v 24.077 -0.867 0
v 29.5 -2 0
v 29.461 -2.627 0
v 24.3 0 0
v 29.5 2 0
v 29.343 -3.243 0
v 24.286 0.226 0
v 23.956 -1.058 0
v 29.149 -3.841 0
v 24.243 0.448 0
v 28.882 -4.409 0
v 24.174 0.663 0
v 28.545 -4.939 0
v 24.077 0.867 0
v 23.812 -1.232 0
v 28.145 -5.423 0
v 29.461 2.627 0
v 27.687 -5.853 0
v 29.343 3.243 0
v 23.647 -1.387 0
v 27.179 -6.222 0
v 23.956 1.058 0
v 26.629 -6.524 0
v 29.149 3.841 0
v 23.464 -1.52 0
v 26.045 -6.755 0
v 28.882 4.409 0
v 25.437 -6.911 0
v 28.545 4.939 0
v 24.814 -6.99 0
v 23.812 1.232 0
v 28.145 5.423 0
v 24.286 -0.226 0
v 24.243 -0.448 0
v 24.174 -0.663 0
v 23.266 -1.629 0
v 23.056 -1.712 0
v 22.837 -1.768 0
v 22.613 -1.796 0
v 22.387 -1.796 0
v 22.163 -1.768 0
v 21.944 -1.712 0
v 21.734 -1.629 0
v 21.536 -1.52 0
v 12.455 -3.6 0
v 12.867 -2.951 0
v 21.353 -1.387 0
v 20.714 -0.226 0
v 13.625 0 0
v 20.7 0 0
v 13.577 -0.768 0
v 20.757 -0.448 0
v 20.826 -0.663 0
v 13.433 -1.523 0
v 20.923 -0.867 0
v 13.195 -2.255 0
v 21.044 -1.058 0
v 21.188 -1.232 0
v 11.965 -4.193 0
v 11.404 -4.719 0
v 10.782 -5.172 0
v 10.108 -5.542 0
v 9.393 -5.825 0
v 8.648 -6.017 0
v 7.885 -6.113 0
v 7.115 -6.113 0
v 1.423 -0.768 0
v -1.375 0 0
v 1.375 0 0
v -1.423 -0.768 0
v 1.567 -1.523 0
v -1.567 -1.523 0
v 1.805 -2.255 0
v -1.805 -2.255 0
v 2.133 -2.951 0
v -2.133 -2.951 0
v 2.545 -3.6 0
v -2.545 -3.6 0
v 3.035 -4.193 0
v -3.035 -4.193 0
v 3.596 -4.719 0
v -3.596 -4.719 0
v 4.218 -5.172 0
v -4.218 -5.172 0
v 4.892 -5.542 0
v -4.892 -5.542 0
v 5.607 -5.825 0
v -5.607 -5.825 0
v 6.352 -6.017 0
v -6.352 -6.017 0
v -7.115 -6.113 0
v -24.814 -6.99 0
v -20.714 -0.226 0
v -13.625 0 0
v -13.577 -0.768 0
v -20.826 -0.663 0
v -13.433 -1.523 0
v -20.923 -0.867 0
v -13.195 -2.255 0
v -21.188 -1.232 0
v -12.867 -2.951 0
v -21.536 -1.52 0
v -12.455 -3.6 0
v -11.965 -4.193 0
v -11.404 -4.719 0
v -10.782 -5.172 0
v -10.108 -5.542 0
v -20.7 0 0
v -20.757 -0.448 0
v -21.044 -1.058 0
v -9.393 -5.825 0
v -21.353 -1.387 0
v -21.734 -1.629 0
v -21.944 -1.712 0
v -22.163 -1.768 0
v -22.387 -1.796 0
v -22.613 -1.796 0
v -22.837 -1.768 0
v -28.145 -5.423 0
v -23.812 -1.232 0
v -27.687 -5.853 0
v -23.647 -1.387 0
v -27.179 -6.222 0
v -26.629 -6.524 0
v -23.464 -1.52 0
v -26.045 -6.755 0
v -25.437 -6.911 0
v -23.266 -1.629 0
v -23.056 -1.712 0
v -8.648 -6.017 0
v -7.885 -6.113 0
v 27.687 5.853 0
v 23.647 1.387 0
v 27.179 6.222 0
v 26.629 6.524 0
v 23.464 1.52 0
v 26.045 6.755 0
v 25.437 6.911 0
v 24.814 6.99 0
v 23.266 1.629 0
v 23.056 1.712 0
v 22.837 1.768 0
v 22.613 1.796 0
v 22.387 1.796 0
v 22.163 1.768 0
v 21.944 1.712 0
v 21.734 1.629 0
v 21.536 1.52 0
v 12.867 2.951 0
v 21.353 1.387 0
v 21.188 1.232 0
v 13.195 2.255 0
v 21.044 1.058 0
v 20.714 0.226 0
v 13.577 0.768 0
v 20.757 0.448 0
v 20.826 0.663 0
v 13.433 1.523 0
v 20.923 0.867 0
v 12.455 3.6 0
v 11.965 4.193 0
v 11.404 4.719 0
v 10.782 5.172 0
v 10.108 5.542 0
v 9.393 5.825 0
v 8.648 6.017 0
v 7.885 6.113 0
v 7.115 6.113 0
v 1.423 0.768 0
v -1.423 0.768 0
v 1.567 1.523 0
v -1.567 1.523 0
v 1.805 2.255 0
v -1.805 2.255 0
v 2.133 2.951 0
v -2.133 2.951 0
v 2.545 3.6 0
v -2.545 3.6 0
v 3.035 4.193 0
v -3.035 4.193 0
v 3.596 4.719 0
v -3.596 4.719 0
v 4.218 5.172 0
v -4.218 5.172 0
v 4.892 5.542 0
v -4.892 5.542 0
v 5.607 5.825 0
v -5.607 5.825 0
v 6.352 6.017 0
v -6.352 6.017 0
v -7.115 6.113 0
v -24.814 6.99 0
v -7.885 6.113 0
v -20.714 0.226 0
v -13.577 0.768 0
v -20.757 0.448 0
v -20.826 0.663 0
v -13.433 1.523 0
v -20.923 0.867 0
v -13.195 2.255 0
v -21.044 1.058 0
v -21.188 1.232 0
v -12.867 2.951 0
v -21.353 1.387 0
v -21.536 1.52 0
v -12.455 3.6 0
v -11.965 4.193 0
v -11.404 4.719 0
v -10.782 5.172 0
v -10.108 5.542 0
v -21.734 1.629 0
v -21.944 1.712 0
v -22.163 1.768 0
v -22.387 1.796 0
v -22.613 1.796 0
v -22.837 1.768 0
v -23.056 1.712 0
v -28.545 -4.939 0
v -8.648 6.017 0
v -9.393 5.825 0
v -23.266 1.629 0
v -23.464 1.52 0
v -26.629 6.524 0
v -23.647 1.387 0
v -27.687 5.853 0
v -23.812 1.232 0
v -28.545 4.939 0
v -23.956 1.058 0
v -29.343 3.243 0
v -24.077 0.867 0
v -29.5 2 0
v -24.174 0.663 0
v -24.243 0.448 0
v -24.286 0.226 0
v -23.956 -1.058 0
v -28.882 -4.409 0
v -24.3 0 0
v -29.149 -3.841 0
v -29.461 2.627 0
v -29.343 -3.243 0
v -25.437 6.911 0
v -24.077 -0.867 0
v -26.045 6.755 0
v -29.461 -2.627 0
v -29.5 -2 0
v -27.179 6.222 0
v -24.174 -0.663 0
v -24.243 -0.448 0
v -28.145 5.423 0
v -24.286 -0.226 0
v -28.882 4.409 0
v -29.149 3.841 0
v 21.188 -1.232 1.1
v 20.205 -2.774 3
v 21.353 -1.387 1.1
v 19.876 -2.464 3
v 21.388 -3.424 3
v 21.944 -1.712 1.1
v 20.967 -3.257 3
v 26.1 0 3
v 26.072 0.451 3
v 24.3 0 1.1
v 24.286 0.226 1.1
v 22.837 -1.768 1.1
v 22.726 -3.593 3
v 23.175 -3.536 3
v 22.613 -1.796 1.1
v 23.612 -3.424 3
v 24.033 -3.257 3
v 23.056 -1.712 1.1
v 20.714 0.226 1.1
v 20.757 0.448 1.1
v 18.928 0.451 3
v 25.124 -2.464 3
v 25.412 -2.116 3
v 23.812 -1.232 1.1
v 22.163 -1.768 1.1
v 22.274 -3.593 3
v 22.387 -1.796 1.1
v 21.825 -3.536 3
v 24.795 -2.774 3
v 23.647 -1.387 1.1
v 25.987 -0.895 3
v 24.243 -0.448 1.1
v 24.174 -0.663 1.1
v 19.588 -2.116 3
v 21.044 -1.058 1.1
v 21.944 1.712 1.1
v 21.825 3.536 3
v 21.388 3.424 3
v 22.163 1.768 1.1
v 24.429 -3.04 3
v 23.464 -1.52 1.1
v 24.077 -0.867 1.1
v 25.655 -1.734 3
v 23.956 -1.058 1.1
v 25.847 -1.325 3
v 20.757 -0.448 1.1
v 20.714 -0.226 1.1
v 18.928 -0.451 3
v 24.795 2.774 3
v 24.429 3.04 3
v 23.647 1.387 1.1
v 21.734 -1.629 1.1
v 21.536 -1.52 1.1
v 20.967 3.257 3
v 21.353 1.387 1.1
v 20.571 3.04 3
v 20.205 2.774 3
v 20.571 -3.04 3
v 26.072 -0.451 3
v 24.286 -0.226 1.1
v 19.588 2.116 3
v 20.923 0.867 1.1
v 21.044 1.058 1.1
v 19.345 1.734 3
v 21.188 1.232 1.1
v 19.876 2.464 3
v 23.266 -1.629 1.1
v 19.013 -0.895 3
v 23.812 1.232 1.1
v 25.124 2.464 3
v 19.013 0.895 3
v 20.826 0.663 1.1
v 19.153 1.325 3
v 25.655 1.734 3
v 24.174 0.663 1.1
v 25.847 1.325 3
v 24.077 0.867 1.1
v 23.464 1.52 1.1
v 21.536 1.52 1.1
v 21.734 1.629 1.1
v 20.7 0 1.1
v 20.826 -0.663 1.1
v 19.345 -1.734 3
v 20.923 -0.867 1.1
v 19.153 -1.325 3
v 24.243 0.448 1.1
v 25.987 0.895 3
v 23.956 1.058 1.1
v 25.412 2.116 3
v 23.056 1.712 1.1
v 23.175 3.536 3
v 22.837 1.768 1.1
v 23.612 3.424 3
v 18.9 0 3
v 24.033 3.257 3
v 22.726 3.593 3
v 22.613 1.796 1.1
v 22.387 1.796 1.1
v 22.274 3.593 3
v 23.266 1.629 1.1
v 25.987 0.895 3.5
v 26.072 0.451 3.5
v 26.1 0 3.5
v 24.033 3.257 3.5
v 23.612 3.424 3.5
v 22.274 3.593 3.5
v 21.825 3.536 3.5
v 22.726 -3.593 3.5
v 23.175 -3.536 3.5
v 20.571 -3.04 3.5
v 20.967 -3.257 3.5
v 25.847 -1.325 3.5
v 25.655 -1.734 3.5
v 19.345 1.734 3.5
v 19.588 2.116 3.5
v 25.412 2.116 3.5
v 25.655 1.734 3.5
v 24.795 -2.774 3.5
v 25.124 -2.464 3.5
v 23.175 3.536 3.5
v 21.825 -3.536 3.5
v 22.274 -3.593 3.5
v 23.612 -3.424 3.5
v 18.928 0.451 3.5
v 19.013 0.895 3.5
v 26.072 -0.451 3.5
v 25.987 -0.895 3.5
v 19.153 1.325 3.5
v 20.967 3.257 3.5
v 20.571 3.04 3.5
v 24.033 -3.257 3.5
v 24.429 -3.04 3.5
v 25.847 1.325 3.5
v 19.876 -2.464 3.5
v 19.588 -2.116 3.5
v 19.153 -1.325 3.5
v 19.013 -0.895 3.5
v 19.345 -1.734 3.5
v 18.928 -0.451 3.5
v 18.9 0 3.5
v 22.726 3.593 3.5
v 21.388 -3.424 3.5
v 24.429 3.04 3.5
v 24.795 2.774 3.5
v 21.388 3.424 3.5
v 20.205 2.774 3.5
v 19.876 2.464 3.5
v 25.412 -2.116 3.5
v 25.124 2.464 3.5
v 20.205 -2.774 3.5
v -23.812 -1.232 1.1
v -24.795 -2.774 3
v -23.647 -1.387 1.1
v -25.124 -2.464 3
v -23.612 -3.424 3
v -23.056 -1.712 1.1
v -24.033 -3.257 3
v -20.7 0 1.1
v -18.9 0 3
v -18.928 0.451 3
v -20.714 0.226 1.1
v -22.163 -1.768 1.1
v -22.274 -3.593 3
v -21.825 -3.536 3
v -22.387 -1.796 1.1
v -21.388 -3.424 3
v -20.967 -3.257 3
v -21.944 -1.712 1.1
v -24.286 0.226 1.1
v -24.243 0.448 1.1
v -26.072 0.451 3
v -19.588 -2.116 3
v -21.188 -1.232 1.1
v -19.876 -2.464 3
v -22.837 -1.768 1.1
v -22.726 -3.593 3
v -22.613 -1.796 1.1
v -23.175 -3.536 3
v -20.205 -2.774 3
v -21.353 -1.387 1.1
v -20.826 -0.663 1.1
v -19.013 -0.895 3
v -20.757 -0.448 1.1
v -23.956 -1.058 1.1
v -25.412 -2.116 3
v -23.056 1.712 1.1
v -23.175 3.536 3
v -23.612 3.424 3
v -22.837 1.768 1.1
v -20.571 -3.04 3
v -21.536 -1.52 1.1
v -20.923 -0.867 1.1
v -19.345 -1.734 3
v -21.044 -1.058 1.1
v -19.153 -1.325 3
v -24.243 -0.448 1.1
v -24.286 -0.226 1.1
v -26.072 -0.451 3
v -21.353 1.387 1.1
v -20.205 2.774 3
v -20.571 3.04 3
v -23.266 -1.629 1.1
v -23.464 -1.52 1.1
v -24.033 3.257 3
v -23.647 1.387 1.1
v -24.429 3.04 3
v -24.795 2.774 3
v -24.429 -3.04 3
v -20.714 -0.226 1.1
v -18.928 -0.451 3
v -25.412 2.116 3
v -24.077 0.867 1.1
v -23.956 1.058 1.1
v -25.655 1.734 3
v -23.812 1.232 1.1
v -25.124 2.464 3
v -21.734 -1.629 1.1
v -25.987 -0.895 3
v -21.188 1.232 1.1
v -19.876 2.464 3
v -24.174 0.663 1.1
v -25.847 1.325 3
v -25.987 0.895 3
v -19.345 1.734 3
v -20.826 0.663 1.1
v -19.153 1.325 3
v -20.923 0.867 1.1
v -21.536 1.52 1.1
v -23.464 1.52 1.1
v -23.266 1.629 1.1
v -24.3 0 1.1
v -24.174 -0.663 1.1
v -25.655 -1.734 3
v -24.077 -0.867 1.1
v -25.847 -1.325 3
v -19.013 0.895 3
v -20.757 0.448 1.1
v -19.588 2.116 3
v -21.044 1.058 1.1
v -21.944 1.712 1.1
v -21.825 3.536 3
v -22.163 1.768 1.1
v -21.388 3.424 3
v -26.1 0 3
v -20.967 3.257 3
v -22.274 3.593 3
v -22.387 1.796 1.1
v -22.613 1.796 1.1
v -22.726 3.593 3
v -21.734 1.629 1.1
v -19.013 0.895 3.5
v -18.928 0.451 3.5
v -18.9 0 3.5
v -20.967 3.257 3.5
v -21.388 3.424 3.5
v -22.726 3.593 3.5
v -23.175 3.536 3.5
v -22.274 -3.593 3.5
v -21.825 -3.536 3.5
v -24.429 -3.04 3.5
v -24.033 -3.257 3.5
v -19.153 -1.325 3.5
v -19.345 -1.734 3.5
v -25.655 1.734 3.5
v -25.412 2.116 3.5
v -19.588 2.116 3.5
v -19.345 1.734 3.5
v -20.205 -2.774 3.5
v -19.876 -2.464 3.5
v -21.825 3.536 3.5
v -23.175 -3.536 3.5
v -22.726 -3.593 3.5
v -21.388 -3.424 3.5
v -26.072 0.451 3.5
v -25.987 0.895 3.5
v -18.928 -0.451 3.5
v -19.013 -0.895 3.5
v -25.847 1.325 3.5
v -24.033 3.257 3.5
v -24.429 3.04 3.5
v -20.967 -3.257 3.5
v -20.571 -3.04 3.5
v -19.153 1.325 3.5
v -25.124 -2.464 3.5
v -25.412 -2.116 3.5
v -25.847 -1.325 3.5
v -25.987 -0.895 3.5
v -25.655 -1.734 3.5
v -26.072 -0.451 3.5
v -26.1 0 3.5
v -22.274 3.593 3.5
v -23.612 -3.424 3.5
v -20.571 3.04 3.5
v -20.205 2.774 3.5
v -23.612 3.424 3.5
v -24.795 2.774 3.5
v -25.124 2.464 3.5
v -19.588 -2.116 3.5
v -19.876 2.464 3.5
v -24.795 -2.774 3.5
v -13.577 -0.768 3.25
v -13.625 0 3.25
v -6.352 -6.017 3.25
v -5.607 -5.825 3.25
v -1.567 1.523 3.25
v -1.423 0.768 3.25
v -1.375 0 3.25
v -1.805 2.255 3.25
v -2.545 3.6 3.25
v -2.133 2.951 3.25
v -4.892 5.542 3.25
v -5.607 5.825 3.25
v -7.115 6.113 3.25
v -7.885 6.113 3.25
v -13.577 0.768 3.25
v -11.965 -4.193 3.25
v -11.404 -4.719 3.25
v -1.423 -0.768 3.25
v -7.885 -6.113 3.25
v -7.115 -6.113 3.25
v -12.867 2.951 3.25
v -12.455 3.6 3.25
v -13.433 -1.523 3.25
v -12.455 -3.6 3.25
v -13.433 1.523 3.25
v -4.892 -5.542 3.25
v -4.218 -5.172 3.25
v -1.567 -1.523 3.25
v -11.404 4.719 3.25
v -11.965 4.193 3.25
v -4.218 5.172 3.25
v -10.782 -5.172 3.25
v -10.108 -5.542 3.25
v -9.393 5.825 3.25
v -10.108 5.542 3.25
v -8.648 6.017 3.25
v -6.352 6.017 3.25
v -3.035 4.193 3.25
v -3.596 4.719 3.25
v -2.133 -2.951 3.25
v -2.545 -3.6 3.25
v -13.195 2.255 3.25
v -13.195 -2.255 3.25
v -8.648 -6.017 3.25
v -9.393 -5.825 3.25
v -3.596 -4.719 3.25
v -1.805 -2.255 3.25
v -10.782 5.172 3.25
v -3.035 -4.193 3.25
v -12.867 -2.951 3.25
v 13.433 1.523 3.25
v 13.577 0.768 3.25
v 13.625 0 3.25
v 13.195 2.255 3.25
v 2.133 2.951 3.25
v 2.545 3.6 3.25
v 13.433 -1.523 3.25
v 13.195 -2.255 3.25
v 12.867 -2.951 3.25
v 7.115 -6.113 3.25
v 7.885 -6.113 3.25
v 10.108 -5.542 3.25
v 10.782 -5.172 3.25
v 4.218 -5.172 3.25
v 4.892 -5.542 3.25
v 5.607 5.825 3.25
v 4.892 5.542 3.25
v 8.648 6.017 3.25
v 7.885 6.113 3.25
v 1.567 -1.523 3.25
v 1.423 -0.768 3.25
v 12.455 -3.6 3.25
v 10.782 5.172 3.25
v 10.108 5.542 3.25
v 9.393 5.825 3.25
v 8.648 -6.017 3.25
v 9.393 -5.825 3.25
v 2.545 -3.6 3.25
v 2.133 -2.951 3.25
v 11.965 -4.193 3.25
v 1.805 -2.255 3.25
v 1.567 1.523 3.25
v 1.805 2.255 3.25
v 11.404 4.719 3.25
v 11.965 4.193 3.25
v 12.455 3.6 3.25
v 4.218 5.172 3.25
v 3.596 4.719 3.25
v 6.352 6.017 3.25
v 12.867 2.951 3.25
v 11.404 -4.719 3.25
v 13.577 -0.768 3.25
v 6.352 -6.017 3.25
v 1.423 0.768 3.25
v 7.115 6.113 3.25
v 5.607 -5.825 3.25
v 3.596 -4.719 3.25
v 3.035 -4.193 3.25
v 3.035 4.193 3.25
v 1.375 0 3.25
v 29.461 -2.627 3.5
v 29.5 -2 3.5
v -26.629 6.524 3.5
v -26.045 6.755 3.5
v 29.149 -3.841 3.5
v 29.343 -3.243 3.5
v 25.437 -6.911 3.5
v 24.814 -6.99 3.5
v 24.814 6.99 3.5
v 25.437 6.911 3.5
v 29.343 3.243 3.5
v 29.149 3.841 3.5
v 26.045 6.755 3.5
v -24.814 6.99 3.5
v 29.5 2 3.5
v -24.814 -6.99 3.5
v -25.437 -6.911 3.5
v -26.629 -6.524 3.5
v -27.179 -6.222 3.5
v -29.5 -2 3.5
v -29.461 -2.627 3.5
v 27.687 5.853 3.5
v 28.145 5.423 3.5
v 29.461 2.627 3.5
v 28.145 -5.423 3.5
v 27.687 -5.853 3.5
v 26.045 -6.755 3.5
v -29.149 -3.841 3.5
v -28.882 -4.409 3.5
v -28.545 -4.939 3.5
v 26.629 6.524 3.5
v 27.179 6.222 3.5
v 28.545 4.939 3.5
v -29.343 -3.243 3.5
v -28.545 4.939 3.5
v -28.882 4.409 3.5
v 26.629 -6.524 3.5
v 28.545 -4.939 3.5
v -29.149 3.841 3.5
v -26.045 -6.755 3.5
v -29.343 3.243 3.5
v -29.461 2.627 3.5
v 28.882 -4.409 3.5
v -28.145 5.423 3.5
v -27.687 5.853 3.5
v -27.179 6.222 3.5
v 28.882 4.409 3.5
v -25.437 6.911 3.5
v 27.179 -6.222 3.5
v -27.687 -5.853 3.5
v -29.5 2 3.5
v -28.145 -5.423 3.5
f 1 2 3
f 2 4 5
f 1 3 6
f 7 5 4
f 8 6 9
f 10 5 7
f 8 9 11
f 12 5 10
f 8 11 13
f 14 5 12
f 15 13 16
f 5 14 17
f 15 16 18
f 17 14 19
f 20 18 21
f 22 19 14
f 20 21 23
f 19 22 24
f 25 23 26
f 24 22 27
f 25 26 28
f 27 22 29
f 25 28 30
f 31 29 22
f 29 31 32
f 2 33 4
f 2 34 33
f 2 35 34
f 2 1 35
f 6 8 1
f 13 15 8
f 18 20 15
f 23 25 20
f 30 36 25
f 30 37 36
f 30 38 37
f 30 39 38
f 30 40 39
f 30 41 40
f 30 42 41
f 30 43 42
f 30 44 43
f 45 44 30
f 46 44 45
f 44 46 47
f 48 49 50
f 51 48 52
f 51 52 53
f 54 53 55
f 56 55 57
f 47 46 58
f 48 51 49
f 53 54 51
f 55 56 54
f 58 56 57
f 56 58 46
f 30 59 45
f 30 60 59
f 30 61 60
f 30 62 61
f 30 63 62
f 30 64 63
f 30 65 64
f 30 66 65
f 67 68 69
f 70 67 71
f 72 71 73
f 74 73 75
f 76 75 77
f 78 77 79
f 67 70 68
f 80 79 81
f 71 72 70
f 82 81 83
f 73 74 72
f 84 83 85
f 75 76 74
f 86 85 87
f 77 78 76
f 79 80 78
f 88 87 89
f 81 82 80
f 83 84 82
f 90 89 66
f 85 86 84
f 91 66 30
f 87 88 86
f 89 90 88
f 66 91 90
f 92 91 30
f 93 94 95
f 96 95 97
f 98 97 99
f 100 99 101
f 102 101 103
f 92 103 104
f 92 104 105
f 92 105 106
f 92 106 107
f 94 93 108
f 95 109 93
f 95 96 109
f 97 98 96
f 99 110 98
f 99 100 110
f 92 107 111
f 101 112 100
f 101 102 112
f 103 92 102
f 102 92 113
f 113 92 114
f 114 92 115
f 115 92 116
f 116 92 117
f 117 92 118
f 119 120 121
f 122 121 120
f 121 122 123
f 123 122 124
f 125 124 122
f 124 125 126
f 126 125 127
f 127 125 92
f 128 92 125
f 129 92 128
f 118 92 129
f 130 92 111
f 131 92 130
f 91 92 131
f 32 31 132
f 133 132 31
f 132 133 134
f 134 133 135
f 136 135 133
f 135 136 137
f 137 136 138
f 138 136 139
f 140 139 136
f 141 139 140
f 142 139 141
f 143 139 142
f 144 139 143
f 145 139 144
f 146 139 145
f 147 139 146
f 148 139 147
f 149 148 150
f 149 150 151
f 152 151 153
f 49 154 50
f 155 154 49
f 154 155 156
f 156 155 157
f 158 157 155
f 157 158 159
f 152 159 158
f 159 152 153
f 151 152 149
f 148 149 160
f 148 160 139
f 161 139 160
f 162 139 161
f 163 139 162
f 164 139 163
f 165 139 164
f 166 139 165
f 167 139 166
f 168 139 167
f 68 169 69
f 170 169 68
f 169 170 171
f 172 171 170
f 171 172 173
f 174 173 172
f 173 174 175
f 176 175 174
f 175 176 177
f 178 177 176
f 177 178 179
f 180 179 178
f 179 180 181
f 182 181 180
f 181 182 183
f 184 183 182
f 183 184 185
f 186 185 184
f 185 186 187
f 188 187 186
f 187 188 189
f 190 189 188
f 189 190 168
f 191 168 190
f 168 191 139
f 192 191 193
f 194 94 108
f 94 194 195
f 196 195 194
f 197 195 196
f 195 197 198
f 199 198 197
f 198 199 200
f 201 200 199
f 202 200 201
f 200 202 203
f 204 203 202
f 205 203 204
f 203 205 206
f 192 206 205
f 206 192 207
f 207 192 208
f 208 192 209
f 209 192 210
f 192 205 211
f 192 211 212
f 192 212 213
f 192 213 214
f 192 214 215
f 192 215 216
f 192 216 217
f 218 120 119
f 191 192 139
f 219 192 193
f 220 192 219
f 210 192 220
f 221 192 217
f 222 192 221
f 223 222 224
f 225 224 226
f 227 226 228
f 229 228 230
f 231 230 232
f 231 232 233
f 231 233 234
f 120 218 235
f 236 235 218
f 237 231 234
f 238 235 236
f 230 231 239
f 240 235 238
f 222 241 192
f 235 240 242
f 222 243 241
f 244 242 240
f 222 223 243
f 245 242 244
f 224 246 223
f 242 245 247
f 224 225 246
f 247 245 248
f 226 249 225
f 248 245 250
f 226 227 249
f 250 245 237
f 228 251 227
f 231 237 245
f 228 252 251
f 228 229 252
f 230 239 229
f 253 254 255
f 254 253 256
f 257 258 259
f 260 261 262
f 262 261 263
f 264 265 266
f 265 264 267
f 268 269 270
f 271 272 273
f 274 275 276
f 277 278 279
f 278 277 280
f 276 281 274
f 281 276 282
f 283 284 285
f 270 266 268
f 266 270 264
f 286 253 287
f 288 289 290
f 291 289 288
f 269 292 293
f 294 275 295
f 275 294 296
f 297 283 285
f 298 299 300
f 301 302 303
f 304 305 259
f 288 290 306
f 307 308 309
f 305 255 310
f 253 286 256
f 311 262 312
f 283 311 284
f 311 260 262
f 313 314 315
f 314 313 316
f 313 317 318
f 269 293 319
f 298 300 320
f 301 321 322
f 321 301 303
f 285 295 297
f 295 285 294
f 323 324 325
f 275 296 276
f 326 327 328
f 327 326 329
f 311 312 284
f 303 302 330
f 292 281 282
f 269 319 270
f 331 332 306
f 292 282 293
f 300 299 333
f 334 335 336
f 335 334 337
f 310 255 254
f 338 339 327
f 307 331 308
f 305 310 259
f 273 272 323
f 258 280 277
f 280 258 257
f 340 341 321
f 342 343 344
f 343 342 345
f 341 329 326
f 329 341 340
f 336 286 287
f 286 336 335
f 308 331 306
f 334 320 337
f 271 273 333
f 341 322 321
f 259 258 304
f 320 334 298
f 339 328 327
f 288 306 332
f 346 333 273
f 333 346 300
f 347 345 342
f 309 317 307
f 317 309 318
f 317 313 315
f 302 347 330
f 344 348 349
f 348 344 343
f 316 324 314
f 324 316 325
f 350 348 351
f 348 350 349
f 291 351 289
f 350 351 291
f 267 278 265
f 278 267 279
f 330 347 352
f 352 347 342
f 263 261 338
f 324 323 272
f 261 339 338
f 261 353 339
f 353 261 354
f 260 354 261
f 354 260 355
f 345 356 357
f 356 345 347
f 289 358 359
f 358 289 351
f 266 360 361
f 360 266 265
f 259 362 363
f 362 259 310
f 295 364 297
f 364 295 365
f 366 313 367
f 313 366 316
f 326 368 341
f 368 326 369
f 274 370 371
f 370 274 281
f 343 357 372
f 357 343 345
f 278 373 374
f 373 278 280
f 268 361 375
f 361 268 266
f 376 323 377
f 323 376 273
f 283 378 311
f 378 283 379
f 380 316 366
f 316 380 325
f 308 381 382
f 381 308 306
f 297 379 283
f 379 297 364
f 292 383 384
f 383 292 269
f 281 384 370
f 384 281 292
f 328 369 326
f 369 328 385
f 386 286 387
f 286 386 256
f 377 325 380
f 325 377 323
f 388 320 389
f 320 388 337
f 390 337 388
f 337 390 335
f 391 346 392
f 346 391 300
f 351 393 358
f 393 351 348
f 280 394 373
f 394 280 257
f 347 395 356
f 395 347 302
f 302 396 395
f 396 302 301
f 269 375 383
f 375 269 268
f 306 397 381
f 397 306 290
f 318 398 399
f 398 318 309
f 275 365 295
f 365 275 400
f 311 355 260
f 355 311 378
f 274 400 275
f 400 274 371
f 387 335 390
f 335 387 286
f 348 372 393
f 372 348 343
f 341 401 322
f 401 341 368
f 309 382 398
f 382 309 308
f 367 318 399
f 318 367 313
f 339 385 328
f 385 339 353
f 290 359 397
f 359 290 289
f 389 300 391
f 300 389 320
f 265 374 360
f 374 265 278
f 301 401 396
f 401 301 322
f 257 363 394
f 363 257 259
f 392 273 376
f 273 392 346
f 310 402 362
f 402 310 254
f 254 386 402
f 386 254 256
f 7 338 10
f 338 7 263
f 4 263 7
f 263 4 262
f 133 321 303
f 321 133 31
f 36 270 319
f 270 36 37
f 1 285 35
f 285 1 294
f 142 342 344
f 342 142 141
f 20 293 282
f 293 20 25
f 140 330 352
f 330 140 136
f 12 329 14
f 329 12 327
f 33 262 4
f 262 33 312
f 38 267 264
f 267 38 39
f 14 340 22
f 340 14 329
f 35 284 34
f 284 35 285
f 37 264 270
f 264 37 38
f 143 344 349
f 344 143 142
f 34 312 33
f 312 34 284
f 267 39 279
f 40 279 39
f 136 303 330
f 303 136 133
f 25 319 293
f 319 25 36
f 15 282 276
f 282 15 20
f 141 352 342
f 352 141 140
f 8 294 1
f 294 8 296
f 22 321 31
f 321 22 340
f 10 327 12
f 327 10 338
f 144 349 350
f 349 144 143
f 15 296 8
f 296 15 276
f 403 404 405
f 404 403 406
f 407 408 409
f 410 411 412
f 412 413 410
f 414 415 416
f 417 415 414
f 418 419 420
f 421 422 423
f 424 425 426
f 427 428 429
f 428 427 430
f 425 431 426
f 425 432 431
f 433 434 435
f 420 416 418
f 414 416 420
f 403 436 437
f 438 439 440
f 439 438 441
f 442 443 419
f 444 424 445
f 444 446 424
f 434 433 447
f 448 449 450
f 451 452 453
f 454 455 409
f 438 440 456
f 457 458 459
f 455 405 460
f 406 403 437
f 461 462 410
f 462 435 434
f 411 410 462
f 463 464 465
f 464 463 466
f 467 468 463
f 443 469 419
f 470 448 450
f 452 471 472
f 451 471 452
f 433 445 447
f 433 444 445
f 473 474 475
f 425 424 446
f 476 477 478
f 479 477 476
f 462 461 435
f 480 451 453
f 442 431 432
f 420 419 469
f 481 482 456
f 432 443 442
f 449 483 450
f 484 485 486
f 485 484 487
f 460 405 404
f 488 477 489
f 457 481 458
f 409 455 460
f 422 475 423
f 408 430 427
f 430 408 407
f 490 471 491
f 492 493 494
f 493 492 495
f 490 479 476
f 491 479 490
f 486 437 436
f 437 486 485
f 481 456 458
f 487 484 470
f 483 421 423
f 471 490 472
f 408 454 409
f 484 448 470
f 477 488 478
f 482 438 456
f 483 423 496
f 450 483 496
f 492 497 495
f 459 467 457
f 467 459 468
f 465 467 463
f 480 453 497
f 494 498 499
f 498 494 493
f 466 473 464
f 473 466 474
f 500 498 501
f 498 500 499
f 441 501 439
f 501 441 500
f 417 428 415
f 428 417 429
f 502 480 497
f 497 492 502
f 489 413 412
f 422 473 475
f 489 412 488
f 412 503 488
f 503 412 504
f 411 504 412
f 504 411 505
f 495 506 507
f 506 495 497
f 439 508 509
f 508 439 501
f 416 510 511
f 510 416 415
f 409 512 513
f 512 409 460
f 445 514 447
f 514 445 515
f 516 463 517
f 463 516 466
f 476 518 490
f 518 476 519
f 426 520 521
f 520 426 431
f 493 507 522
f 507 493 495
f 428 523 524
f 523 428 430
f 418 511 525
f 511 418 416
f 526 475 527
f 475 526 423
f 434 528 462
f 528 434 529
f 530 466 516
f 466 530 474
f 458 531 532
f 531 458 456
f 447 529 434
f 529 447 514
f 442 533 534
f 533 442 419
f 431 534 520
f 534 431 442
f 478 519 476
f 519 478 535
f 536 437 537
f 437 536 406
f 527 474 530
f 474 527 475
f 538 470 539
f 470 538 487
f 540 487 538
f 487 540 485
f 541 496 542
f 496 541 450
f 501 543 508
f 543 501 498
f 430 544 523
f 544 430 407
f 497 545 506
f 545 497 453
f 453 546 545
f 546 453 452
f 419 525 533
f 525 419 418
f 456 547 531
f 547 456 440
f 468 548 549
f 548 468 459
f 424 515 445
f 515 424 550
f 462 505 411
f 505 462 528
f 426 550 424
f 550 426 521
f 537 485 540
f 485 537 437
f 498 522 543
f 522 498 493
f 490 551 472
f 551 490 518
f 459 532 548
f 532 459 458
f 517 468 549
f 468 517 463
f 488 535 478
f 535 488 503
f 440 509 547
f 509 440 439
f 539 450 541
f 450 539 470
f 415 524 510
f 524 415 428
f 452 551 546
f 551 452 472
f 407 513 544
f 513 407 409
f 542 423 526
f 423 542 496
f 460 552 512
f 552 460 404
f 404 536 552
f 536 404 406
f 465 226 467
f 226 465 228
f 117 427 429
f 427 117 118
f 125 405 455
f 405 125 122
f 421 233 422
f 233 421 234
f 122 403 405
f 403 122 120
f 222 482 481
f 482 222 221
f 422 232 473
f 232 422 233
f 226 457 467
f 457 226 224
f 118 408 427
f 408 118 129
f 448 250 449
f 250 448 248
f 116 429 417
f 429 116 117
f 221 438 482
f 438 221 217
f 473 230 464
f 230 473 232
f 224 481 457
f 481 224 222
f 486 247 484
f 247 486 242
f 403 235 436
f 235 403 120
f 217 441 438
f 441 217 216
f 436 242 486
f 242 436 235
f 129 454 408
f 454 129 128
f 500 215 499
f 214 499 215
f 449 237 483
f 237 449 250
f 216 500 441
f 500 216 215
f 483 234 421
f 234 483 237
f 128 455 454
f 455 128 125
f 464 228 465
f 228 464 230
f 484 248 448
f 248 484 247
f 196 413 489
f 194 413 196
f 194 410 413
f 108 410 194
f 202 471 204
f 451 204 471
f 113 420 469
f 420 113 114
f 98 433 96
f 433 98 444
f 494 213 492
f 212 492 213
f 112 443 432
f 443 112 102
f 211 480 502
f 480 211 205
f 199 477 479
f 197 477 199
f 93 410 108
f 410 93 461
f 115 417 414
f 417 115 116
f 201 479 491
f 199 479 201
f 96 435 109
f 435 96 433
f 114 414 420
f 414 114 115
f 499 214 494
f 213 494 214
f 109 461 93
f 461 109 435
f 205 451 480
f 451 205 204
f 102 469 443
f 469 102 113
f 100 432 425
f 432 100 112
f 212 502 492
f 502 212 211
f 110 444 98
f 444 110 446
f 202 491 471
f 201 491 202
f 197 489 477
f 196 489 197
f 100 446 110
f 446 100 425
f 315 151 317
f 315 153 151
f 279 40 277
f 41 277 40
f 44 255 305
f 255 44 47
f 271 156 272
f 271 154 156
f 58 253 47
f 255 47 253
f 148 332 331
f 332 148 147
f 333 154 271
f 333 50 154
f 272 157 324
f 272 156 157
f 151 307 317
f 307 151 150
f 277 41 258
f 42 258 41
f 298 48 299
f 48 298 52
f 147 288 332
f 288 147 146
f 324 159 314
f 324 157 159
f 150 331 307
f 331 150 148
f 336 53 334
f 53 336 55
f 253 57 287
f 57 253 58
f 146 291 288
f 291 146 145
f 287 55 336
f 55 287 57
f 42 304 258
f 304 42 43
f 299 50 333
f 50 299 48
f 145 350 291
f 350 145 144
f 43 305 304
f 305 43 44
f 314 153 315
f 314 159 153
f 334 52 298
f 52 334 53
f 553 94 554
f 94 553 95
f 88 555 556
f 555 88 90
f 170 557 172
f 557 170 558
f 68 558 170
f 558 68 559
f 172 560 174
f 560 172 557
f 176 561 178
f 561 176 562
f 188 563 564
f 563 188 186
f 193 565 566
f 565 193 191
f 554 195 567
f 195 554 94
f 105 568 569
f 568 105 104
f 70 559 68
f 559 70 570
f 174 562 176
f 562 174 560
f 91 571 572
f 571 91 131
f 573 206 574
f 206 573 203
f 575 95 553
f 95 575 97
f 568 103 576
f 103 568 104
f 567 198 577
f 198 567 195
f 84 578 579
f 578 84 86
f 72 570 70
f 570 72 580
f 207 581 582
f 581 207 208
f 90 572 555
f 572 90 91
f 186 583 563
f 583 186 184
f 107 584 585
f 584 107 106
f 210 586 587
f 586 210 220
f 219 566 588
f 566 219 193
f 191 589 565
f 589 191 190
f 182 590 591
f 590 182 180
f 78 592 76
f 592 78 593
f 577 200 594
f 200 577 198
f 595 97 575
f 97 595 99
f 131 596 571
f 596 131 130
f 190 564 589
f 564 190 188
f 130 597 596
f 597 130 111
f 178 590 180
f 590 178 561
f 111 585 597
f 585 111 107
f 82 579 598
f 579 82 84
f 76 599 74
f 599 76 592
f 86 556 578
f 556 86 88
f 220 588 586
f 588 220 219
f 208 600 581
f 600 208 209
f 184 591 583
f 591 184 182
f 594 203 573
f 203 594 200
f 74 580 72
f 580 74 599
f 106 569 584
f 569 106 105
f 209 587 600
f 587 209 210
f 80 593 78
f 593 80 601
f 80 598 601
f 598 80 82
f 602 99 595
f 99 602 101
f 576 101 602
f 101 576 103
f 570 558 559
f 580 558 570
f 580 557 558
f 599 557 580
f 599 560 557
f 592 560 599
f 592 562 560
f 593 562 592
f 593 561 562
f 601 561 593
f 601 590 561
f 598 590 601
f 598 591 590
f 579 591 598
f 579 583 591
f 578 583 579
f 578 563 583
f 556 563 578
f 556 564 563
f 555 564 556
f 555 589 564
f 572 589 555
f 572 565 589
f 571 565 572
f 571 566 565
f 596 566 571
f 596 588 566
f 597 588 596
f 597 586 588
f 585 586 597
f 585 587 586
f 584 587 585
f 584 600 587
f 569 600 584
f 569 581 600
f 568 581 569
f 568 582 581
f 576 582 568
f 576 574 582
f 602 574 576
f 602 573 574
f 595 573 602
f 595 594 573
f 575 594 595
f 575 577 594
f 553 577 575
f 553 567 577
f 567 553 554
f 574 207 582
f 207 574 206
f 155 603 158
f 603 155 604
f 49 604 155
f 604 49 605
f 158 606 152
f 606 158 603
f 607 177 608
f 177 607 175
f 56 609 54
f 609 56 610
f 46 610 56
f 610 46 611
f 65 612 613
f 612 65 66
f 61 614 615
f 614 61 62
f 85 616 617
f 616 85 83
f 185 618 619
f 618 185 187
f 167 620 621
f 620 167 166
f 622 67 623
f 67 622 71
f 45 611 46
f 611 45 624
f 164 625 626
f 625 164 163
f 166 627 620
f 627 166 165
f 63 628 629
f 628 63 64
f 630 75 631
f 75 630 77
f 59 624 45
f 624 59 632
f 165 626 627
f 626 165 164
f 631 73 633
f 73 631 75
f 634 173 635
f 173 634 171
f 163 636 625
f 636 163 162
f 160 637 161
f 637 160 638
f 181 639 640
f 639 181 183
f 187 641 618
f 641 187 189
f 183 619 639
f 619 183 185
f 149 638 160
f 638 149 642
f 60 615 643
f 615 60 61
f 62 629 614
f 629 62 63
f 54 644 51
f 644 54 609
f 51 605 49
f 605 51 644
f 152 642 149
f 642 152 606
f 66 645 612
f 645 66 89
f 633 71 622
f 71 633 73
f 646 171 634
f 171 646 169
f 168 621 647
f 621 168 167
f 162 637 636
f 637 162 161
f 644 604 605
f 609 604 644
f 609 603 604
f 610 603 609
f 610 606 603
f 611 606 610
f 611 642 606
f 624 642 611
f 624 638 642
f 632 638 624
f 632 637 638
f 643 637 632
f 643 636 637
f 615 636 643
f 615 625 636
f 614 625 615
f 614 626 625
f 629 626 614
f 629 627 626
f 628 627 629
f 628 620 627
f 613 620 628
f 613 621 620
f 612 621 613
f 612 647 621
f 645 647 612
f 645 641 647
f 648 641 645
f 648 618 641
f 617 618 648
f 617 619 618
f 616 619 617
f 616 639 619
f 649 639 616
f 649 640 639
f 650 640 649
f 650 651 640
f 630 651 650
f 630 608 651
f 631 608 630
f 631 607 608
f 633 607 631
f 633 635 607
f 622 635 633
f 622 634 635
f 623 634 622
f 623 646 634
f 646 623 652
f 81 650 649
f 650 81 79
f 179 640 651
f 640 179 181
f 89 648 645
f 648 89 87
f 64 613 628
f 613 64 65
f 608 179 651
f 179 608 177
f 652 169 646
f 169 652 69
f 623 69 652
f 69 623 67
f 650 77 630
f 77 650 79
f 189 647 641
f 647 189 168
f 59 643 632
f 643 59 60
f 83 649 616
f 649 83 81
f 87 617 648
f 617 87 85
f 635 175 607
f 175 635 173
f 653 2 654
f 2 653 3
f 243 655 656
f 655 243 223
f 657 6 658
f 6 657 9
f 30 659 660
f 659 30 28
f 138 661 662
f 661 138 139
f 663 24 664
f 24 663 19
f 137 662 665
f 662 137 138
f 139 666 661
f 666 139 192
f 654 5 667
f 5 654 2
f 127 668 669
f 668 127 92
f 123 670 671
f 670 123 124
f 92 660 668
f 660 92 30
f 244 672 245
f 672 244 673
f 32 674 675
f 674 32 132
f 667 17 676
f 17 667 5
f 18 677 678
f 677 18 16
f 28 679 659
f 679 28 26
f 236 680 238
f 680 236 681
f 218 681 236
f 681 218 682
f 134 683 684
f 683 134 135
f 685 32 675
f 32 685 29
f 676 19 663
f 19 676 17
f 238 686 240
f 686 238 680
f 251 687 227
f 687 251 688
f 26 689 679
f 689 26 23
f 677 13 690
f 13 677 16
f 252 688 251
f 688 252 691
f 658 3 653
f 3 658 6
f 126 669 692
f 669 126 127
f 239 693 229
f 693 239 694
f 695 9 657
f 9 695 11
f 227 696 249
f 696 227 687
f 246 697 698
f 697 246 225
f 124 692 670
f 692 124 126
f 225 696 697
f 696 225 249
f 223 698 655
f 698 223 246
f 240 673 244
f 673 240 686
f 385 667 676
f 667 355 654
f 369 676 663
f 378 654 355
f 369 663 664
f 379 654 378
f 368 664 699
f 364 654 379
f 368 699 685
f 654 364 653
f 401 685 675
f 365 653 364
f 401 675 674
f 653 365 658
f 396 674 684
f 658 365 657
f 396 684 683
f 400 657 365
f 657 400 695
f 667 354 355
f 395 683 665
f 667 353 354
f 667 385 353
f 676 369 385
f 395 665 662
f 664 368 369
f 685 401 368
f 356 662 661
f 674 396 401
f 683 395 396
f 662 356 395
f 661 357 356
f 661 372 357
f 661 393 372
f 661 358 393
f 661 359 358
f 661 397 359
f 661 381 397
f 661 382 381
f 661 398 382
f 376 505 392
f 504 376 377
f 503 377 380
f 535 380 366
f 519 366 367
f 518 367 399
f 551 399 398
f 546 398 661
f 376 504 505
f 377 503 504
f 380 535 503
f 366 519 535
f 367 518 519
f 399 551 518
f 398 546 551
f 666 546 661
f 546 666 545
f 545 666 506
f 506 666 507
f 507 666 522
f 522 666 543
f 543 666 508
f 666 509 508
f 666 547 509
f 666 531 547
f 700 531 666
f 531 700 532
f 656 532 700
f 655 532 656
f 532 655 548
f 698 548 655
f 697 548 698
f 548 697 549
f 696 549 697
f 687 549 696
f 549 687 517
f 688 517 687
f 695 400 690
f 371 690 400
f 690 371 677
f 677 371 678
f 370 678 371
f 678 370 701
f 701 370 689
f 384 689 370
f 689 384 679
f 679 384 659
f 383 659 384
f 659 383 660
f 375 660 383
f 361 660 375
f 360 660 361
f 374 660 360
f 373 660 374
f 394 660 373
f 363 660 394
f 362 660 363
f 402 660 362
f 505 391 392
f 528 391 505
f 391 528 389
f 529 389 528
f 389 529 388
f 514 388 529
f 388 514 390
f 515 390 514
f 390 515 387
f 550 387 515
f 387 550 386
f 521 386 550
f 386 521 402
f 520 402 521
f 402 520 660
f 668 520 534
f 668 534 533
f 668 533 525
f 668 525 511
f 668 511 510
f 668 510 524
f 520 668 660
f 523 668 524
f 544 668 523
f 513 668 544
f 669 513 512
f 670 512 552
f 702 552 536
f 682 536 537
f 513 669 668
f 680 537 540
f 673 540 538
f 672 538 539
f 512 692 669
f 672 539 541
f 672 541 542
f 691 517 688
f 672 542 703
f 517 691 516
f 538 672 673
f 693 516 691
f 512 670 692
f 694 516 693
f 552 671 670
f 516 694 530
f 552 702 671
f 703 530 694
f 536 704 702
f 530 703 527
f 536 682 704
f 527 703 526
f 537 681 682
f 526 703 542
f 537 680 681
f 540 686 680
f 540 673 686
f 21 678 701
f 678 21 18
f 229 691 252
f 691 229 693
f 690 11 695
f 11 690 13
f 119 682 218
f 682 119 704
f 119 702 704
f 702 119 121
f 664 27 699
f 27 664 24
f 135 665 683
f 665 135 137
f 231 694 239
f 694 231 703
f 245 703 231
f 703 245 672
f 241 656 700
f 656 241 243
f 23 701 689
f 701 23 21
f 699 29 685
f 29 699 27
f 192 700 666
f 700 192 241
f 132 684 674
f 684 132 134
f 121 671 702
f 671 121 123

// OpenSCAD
$fn = 50;


difference() {
	union() {
		hull() {
			translate(v = [-24.5000000000, 2.0000000000, 0]) {
				cylinder(h = 3.5000000000, r = 5);
			}
			translate(v = [24.5000000000, 2.0000000000, 0]) {
				cylinder(h = 3.5000000000, r = 5);
			}
			translate(v = [-24.5000000000, -2.0000000000, 0]) {
				cylinder(h = 3.5000000000, r = 5);
			}
			translate(v = [24.5000000000, -2.0000000000, 0]) {
				cylinder(h = 3.5000000000, r = 5);
			}
		}
	}
	union() {
		translate(v = [22.5000000000, 0, 3.0000000000]) {
			rotate(a = [0, 0, 0]) {
				difference() {
					union() {
						translate(v = [0, 0, -3.0000000000]) {
							cylinder(h = 3.0000000000, r = 1.5000000000);
						}
						translate(v = [0, 0, -1.9000000000]) {
							cylinder(h = 1.9000000000, r1 = 1.8000000000, r2 = 3.6000000000);
						}
						cylinder(h = 250, r = 3.6000000000);
						translate(v = [0, 0, -3.0000000000]) {
							cylinder(h = 3.0000000000, r = 1.8000000000);
						}
						translate(v = [0, 0, -3.0000000000]) {
							cylinder(h = 3.0000000000, r = 1.5000000000);
						}
					}
					union();
				}
			}
		}
		translate(v = [-22.5000000000, 0, 3.0000000000]) {
			rotate(a = [0, 0, 0]) {
				difference() {
					union() {
						translate(v = [0, 0, -3.0000000000]) {
							cylinder(h = 3.0000000000, r = 1.5000000000);
						}
						translate(v = [0, 0, -1.9000000000]) {
							cylinder(h = 1.9000000000, r1 = 1.8000000000, r2 = 3.6000000000);
						}
						cylinder(h = 250, r = 3.6000000000);
						translate(v = [0, 0, -3.0000000000]) {
							cylinder(h = 3.0000000000, r = 1.8000000000);
						}
						translate(v = [0, 0, -3.0000000000]) {
							cylinder(h = 3.0000000000, r = 1.5000000000);
						}
					}
					union();
				}
			}
		}
		translate(v = [-22.5000000000, 0.0000000000, 0]) {
			cylinder(h = 3.5000000000, r = 1.8000000000);
		}
		translate(v = [22.5000000000, 0.0000000000, 0]) {
			cylinder(h = 3.5000000000, r = 1.8000000000);
		}
		translate(v = [-22.5000000000, 0.0000000000, 0]) {
			cylinder(h = 3.5000000000, r = 1.8000000000);
		}
		translate(v = [22.5000000000, 0.0000000000, 0]) {
			cylinder(h = 3.5000000000, r = 1.8000000000);
		}
		translate(v = [-22.5000000000, 0.0000000000, 0]) {
			cylinder(h = 3.5000000000, r = 1.8000000000);
		}
		translate(v = [22.5000000000, 0.0000000000, 0]) {
			cylinder(h = 3.5000000000, r = 1.8000000000);
		}
		translate(v = [-22.5000000000, 0.0000000000, 0]) {
			cylinder(h = 3.5000000000, r = 1.8000000000);
		}
		translate(v = [22.5000000000, 0.0000000000, 0]) {
			cylinder(h = 3.5000000000, r = 1.8000000000);
		}
		#translate(v = [-7.5000000000, 0, 0.0000000000]) {
			cylinder(h = 3.2500000000, r = 6.1250000000);
		}
		#translate(v = [7.5000000000, 0, 0.0000000000]) {
			cylinder(h = 3.2500000000, r = 6.1250000000);
		}
	}
}
